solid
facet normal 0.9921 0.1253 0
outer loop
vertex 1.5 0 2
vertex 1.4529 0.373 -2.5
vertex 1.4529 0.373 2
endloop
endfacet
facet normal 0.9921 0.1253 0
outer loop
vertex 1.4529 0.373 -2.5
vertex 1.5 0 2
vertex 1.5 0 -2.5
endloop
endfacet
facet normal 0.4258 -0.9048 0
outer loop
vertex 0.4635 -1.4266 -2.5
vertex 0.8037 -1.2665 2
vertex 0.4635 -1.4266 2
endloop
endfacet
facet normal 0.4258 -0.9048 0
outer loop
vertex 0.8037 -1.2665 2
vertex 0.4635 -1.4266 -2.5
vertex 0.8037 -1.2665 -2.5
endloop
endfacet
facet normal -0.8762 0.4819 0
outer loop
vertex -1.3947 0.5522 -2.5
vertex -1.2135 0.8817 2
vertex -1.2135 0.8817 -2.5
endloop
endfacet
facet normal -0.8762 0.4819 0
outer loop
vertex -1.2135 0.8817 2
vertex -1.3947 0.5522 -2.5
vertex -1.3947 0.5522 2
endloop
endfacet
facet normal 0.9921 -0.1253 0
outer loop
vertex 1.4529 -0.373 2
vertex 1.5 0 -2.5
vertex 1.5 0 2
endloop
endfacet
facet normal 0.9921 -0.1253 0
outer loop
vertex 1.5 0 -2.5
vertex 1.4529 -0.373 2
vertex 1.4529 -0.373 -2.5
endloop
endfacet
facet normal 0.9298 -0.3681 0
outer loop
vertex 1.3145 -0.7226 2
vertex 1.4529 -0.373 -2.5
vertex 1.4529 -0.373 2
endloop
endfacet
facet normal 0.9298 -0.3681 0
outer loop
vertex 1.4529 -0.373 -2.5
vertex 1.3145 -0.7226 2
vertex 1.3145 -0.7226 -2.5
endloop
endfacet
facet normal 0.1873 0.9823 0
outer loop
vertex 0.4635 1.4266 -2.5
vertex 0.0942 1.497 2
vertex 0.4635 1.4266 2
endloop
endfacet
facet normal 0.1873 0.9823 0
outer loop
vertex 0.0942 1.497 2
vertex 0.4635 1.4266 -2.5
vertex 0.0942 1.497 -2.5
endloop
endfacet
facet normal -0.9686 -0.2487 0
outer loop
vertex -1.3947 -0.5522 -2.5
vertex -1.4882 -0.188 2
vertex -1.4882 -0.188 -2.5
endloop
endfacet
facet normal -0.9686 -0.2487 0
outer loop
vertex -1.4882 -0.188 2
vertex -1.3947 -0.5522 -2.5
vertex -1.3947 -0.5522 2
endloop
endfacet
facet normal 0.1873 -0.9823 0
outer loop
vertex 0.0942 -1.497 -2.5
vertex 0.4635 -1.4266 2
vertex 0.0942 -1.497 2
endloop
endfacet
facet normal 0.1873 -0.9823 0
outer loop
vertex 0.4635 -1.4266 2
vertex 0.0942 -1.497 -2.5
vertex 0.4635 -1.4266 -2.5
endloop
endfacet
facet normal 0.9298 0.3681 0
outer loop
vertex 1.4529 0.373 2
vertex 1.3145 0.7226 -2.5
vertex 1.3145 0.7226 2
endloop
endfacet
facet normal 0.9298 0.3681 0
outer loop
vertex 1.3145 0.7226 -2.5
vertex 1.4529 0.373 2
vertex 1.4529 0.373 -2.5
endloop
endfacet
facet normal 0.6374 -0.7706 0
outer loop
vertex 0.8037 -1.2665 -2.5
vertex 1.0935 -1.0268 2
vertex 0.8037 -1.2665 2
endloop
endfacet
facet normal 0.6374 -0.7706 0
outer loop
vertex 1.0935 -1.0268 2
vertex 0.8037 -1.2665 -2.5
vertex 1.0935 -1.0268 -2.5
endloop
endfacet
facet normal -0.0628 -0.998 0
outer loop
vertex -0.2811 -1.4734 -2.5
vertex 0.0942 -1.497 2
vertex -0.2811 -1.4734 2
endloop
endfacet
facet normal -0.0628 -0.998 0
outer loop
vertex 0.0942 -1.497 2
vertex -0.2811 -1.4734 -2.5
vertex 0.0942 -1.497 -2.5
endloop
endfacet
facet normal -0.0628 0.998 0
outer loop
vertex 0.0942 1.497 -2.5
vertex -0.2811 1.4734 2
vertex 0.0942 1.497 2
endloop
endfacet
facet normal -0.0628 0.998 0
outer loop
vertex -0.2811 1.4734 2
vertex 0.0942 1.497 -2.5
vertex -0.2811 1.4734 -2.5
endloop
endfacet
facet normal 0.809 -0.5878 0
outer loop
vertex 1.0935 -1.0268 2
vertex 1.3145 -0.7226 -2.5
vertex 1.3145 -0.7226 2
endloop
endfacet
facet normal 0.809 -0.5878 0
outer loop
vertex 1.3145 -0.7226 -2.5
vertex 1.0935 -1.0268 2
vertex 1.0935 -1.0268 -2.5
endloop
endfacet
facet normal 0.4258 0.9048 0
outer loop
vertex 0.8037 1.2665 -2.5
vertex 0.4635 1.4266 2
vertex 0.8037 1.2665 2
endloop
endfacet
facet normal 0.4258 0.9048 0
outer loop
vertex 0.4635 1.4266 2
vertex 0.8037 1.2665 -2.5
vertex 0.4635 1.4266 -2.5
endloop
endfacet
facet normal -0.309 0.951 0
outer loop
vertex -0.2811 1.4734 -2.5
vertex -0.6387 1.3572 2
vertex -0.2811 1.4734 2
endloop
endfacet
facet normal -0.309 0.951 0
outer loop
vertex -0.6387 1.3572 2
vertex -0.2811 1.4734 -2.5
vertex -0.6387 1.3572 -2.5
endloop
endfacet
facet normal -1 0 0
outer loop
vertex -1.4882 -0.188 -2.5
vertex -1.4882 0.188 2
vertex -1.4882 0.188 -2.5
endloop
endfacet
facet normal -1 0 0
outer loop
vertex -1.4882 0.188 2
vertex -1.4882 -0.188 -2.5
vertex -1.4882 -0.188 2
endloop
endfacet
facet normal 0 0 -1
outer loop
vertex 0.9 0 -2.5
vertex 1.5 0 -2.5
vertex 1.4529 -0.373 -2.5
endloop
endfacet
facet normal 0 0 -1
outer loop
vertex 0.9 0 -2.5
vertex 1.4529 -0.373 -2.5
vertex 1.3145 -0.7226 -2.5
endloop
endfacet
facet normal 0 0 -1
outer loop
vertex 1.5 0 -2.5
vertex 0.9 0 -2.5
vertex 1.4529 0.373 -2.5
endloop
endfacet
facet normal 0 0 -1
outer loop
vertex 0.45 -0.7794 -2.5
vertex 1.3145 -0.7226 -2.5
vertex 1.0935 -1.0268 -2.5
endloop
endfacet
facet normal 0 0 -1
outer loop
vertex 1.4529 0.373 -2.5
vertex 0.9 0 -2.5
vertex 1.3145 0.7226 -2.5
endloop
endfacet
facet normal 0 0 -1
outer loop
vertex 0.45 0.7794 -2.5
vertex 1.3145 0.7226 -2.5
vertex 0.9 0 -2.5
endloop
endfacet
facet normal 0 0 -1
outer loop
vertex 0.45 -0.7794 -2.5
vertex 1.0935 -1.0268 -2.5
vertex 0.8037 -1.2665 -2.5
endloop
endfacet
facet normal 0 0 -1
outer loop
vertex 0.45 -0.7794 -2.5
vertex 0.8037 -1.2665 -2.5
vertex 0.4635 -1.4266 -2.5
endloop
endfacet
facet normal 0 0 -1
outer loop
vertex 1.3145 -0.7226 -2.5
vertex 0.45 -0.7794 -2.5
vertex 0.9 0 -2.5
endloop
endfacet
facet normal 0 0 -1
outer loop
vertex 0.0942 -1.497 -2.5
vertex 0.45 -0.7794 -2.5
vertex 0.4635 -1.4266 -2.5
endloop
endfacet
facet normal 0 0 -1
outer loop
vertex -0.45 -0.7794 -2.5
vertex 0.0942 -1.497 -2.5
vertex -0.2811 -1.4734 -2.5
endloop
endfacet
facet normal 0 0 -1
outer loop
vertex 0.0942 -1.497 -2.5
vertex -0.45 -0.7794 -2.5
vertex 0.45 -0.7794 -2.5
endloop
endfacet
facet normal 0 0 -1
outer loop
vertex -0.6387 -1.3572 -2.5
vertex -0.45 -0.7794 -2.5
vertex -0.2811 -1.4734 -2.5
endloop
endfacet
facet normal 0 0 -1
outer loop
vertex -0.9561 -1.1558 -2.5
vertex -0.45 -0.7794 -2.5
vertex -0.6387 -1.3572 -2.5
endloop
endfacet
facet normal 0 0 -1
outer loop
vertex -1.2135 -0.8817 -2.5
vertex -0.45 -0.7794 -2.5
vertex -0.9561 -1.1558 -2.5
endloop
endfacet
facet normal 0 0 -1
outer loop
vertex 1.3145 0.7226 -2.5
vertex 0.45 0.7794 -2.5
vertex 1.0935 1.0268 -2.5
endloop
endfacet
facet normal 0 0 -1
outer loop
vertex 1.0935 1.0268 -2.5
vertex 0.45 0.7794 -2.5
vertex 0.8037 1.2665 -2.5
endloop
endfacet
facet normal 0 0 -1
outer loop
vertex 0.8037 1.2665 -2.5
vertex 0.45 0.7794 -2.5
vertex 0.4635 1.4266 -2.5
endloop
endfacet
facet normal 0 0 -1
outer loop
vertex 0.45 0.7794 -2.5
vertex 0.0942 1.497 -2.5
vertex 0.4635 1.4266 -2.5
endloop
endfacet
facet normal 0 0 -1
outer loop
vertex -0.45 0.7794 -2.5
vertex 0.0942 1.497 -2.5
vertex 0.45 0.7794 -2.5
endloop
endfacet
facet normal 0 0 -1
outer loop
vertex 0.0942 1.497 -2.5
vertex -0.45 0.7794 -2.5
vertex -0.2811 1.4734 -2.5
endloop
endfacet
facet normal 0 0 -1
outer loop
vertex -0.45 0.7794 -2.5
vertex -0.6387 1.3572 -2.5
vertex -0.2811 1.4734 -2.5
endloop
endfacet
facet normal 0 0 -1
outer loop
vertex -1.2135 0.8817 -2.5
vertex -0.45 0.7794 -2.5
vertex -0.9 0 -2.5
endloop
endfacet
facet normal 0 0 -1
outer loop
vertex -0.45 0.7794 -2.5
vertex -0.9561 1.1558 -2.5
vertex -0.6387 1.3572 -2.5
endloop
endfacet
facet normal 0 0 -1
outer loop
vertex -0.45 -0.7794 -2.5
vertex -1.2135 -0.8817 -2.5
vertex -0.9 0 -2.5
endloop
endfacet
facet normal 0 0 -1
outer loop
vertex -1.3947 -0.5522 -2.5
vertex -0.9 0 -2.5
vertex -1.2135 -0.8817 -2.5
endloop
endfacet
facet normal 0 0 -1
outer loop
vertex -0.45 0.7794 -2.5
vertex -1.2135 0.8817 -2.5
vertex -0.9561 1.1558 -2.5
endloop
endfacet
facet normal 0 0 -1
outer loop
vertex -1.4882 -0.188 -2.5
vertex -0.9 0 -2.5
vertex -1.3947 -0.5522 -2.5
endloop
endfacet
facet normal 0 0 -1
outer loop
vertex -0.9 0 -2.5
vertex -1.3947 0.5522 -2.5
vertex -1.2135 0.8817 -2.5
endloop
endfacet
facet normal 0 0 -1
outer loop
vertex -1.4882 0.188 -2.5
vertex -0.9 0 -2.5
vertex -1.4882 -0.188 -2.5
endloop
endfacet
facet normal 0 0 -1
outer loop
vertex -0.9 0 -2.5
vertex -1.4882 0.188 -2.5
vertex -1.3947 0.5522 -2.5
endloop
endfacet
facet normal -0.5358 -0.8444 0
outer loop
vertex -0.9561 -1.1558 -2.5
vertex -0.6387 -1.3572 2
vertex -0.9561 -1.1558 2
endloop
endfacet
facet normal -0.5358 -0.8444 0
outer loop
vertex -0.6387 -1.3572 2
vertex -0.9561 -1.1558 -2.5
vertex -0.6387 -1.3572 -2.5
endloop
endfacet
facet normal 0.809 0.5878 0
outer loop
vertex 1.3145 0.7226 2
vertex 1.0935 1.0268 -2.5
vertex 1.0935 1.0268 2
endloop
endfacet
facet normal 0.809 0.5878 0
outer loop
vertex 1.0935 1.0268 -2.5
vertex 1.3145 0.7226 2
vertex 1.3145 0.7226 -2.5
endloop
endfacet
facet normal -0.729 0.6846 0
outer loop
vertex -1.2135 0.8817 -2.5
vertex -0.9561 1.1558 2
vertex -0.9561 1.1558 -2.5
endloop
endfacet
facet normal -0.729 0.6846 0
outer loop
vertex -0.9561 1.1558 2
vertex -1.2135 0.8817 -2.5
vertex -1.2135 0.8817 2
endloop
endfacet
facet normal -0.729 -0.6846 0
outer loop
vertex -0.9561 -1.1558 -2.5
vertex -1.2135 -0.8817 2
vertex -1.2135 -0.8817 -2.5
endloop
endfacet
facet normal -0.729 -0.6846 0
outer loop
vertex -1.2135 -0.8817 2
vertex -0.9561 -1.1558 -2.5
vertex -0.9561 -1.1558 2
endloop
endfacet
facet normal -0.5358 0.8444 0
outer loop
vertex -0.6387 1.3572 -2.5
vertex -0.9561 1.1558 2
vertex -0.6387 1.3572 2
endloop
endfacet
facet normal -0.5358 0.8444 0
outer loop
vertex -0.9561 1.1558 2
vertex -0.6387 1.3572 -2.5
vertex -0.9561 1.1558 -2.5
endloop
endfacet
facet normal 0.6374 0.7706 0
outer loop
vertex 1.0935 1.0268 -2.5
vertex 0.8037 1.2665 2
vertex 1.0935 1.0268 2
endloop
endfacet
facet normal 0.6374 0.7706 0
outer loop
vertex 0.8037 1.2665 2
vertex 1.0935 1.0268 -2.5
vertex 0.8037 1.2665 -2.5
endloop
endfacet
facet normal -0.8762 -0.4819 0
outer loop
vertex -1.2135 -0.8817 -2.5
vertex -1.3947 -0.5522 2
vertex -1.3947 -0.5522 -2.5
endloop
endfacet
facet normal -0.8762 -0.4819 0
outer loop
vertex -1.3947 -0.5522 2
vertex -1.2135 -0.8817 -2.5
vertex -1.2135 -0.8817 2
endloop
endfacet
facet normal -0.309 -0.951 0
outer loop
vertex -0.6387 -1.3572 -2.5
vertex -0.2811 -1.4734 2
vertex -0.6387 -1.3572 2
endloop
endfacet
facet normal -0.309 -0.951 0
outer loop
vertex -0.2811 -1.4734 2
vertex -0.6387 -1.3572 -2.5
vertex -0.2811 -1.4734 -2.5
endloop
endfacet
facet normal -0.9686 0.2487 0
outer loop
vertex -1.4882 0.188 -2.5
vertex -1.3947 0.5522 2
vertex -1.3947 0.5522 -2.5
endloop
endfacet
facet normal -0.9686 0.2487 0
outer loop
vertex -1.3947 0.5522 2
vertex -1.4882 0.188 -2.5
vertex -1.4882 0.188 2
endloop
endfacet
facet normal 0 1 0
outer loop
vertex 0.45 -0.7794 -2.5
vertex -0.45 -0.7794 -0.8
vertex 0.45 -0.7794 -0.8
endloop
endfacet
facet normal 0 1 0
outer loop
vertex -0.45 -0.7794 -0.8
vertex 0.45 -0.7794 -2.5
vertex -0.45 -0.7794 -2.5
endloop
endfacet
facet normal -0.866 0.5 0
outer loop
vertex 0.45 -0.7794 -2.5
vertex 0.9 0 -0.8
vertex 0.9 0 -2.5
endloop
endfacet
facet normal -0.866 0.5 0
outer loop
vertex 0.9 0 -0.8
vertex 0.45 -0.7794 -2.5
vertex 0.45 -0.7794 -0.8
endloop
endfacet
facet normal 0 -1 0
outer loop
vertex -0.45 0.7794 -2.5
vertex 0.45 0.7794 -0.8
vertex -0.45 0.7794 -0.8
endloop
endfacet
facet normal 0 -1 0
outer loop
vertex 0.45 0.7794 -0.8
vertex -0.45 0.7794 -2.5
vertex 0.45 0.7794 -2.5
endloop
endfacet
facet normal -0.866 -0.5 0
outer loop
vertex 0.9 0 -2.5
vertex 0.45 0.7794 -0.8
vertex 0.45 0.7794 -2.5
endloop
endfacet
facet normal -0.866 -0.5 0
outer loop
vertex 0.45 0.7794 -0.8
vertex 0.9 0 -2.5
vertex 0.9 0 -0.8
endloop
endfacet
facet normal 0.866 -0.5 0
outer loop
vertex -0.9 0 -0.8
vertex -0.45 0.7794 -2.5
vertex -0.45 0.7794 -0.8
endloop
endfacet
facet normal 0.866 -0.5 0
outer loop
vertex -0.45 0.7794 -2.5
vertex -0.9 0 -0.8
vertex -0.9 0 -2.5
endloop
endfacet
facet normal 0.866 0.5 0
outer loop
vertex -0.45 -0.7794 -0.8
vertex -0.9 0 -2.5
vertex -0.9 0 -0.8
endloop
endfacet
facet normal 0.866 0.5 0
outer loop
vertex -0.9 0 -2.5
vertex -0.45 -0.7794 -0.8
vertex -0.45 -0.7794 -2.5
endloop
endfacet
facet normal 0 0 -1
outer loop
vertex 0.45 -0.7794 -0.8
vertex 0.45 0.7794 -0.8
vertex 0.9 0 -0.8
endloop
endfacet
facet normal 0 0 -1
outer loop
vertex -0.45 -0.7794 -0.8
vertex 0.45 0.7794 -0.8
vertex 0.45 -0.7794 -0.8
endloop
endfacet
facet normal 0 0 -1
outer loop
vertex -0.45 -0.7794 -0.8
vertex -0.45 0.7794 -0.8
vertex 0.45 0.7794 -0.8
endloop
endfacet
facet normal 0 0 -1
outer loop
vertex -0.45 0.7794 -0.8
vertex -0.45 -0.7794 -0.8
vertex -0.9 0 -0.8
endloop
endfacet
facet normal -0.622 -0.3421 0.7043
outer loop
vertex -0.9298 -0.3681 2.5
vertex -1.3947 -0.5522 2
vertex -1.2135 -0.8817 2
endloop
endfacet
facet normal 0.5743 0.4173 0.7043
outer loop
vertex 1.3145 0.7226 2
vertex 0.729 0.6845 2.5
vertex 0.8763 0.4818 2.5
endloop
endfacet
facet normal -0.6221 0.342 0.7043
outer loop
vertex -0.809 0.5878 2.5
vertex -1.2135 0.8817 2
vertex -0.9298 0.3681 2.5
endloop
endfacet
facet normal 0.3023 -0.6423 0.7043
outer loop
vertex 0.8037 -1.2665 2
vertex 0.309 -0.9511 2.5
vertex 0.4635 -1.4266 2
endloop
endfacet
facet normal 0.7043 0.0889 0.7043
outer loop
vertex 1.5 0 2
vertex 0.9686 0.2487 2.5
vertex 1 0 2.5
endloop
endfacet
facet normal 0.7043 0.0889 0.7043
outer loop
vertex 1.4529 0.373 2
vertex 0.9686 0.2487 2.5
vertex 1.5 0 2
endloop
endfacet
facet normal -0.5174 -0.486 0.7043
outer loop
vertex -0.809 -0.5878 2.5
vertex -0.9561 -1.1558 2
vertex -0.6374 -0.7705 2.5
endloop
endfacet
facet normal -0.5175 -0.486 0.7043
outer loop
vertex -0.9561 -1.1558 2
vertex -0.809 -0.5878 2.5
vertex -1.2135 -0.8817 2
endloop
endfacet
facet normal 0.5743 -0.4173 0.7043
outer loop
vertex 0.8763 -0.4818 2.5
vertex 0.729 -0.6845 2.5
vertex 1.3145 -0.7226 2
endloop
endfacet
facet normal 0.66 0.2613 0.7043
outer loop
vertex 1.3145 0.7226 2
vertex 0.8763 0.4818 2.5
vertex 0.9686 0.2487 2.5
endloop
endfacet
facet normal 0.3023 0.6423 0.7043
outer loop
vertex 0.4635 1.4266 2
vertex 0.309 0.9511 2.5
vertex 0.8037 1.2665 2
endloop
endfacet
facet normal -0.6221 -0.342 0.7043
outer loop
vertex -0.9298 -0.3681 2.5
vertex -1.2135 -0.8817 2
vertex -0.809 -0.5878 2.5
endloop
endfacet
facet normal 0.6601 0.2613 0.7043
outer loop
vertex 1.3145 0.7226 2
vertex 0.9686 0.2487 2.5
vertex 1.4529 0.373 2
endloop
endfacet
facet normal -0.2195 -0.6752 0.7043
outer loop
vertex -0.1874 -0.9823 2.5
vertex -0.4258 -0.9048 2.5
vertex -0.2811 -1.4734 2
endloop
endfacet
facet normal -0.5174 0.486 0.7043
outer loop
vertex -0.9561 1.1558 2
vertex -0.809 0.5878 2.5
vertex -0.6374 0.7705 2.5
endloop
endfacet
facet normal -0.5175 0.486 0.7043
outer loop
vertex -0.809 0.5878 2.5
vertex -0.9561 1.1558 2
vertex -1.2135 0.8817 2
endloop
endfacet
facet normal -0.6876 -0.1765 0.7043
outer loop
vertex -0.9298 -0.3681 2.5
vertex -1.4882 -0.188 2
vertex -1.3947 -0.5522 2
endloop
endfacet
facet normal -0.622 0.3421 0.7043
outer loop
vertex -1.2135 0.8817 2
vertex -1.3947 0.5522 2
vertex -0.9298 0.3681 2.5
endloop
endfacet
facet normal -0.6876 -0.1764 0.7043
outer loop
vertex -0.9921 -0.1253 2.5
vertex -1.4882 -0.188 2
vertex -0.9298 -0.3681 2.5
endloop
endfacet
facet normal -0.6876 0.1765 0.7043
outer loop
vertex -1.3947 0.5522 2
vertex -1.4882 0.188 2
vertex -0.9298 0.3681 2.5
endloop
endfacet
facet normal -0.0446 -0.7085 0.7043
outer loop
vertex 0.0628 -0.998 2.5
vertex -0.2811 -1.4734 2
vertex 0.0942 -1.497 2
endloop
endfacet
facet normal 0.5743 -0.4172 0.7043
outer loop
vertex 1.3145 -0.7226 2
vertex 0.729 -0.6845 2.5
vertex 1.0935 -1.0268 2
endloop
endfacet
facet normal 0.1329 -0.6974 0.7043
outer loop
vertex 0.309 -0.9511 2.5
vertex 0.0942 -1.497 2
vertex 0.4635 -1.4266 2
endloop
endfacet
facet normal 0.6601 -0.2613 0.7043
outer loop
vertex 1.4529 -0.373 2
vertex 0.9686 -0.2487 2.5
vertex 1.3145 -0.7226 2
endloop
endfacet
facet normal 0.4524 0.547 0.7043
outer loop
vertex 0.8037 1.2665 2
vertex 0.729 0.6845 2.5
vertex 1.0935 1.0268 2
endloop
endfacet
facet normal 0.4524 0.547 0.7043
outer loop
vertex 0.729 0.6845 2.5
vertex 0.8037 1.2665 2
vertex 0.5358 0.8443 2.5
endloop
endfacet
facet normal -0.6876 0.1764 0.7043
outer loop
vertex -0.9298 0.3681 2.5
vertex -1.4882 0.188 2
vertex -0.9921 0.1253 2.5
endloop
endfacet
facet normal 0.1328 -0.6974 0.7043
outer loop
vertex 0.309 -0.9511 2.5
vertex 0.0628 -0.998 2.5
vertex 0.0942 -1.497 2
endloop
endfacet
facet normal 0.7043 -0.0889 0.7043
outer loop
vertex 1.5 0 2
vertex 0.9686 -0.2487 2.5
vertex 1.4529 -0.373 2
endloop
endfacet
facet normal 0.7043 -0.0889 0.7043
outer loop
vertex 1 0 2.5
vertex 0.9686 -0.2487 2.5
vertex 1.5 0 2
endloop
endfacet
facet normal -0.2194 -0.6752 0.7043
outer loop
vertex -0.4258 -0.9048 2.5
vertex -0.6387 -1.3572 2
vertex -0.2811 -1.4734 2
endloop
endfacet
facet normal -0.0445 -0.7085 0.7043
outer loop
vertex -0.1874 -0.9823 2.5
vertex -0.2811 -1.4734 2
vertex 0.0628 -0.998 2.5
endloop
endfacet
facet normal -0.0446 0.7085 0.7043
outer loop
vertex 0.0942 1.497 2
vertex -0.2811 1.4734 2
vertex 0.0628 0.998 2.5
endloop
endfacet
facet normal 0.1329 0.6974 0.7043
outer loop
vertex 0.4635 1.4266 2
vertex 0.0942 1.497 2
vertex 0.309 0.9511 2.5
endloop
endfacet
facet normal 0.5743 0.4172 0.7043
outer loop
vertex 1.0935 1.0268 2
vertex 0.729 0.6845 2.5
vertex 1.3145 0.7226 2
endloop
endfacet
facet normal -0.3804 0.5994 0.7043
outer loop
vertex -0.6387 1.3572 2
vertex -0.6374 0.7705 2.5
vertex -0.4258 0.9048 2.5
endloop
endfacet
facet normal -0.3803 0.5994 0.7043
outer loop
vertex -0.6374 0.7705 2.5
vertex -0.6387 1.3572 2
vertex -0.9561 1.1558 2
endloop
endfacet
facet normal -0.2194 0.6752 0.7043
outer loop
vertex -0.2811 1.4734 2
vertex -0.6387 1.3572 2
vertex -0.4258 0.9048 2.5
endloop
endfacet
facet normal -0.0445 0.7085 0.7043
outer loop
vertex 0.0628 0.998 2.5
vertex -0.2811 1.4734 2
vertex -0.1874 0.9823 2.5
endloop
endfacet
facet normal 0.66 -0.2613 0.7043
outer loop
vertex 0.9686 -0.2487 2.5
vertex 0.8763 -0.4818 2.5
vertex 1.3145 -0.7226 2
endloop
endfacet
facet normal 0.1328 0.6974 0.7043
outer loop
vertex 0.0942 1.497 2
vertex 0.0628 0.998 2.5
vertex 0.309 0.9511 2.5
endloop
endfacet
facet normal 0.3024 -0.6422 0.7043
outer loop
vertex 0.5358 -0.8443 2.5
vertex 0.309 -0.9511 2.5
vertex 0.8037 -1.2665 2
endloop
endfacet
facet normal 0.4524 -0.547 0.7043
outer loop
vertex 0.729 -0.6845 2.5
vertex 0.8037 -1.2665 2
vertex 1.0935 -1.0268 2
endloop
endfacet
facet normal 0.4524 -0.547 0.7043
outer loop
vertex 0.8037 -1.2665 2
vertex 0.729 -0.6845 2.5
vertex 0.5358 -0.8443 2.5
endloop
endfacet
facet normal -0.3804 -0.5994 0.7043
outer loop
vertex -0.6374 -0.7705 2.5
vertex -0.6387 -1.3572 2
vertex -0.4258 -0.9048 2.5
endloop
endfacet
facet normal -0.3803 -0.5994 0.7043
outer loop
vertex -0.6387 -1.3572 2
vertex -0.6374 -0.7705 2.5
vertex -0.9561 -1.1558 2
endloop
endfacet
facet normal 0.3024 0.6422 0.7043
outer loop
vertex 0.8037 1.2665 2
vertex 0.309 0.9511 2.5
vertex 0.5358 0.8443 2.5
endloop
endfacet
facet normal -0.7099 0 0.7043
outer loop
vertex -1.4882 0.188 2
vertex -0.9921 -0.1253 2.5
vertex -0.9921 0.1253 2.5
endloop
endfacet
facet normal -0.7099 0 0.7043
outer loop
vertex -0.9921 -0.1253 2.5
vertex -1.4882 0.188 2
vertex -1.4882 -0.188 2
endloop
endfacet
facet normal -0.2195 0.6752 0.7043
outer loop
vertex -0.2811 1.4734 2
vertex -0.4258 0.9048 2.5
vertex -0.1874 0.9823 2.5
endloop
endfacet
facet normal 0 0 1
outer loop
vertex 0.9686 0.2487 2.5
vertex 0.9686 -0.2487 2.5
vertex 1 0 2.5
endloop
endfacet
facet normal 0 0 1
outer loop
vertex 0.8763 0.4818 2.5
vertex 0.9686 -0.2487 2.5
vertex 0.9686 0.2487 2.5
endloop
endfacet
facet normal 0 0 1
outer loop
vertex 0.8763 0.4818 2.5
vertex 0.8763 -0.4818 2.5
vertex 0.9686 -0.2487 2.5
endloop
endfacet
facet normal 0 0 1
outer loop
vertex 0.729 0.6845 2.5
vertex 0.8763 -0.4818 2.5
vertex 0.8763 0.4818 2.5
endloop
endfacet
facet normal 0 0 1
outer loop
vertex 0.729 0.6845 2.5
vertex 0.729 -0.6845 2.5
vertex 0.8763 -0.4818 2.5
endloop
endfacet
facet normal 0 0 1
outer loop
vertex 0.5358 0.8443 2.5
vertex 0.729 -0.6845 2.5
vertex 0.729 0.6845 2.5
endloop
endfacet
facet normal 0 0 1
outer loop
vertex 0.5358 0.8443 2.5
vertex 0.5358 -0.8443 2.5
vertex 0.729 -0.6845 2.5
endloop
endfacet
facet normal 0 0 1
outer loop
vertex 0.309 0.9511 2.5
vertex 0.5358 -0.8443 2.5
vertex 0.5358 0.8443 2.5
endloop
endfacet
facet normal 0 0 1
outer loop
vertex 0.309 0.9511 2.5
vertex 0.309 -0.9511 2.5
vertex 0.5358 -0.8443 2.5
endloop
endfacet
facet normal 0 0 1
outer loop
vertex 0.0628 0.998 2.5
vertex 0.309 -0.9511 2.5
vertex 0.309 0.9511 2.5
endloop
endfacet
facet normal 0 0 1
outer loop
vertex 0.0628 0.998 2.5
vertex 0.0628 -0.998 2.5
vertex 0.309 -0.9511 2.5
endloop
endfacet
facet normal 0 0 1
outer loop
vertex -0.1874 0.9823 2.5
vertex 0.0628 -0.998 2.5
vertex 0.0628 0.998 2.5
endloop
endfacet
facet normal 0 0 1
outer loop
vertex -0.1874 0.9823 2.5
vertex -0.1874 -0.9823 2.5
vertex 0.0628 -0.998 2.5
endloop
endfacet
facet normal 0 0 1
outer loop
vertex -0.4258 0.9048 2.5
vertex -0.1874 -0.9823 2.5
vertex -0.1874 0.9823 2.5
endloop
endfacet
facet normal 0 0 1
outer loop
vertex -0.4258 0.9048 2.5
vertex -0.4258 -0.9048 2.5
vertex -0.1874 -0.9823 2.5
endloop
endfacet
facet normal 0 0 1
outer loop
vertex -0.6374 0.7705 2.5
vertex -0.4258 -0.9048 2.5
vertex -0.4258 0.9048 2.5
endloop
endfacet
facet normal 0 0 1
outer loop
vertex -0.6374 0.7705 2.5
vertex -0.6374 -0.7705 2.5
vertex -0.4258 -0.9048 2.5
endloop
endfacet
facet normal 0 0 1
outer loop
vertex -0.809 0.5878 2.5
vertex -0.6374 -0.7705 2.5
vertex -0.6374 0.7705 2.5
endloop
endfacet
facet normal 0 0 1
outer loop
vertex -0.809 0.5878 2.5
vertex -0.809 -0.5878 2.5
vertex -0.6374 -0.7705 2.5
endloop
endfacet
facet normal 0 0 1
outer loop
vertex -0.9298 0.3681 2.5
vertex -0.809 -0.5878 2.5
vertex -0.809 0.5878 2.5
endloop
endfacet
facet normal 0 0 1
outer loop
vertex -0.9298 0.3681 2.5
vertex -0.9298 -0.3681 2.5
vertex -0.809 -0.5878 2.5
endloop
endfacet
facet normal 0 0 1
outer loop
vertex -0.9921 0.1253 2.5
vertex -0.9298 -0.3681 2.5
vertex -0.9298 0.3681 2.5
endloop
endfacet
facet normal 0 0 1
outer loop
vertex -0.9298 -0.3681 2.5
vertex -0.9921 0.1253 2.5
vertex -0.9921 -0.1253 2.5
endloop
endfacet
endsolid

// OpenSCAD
// NAME: Grub Screw M3x5
// COLOR: 80
// CATEGORY: Support

color("silver")
translate([0, 0, 2.25])
    cylinder(d1=3, d2=2, h=0.5, center=true, $fn=25);

color("silver")
difference(){
    translate([0, 0, -0.25])
        cylinder(d=3, h=4.5, center=true, $fn=25);
    translate([0, 0, -2.6])
        cylinder(d=1.8, h=1.8, $fn=6);
}
